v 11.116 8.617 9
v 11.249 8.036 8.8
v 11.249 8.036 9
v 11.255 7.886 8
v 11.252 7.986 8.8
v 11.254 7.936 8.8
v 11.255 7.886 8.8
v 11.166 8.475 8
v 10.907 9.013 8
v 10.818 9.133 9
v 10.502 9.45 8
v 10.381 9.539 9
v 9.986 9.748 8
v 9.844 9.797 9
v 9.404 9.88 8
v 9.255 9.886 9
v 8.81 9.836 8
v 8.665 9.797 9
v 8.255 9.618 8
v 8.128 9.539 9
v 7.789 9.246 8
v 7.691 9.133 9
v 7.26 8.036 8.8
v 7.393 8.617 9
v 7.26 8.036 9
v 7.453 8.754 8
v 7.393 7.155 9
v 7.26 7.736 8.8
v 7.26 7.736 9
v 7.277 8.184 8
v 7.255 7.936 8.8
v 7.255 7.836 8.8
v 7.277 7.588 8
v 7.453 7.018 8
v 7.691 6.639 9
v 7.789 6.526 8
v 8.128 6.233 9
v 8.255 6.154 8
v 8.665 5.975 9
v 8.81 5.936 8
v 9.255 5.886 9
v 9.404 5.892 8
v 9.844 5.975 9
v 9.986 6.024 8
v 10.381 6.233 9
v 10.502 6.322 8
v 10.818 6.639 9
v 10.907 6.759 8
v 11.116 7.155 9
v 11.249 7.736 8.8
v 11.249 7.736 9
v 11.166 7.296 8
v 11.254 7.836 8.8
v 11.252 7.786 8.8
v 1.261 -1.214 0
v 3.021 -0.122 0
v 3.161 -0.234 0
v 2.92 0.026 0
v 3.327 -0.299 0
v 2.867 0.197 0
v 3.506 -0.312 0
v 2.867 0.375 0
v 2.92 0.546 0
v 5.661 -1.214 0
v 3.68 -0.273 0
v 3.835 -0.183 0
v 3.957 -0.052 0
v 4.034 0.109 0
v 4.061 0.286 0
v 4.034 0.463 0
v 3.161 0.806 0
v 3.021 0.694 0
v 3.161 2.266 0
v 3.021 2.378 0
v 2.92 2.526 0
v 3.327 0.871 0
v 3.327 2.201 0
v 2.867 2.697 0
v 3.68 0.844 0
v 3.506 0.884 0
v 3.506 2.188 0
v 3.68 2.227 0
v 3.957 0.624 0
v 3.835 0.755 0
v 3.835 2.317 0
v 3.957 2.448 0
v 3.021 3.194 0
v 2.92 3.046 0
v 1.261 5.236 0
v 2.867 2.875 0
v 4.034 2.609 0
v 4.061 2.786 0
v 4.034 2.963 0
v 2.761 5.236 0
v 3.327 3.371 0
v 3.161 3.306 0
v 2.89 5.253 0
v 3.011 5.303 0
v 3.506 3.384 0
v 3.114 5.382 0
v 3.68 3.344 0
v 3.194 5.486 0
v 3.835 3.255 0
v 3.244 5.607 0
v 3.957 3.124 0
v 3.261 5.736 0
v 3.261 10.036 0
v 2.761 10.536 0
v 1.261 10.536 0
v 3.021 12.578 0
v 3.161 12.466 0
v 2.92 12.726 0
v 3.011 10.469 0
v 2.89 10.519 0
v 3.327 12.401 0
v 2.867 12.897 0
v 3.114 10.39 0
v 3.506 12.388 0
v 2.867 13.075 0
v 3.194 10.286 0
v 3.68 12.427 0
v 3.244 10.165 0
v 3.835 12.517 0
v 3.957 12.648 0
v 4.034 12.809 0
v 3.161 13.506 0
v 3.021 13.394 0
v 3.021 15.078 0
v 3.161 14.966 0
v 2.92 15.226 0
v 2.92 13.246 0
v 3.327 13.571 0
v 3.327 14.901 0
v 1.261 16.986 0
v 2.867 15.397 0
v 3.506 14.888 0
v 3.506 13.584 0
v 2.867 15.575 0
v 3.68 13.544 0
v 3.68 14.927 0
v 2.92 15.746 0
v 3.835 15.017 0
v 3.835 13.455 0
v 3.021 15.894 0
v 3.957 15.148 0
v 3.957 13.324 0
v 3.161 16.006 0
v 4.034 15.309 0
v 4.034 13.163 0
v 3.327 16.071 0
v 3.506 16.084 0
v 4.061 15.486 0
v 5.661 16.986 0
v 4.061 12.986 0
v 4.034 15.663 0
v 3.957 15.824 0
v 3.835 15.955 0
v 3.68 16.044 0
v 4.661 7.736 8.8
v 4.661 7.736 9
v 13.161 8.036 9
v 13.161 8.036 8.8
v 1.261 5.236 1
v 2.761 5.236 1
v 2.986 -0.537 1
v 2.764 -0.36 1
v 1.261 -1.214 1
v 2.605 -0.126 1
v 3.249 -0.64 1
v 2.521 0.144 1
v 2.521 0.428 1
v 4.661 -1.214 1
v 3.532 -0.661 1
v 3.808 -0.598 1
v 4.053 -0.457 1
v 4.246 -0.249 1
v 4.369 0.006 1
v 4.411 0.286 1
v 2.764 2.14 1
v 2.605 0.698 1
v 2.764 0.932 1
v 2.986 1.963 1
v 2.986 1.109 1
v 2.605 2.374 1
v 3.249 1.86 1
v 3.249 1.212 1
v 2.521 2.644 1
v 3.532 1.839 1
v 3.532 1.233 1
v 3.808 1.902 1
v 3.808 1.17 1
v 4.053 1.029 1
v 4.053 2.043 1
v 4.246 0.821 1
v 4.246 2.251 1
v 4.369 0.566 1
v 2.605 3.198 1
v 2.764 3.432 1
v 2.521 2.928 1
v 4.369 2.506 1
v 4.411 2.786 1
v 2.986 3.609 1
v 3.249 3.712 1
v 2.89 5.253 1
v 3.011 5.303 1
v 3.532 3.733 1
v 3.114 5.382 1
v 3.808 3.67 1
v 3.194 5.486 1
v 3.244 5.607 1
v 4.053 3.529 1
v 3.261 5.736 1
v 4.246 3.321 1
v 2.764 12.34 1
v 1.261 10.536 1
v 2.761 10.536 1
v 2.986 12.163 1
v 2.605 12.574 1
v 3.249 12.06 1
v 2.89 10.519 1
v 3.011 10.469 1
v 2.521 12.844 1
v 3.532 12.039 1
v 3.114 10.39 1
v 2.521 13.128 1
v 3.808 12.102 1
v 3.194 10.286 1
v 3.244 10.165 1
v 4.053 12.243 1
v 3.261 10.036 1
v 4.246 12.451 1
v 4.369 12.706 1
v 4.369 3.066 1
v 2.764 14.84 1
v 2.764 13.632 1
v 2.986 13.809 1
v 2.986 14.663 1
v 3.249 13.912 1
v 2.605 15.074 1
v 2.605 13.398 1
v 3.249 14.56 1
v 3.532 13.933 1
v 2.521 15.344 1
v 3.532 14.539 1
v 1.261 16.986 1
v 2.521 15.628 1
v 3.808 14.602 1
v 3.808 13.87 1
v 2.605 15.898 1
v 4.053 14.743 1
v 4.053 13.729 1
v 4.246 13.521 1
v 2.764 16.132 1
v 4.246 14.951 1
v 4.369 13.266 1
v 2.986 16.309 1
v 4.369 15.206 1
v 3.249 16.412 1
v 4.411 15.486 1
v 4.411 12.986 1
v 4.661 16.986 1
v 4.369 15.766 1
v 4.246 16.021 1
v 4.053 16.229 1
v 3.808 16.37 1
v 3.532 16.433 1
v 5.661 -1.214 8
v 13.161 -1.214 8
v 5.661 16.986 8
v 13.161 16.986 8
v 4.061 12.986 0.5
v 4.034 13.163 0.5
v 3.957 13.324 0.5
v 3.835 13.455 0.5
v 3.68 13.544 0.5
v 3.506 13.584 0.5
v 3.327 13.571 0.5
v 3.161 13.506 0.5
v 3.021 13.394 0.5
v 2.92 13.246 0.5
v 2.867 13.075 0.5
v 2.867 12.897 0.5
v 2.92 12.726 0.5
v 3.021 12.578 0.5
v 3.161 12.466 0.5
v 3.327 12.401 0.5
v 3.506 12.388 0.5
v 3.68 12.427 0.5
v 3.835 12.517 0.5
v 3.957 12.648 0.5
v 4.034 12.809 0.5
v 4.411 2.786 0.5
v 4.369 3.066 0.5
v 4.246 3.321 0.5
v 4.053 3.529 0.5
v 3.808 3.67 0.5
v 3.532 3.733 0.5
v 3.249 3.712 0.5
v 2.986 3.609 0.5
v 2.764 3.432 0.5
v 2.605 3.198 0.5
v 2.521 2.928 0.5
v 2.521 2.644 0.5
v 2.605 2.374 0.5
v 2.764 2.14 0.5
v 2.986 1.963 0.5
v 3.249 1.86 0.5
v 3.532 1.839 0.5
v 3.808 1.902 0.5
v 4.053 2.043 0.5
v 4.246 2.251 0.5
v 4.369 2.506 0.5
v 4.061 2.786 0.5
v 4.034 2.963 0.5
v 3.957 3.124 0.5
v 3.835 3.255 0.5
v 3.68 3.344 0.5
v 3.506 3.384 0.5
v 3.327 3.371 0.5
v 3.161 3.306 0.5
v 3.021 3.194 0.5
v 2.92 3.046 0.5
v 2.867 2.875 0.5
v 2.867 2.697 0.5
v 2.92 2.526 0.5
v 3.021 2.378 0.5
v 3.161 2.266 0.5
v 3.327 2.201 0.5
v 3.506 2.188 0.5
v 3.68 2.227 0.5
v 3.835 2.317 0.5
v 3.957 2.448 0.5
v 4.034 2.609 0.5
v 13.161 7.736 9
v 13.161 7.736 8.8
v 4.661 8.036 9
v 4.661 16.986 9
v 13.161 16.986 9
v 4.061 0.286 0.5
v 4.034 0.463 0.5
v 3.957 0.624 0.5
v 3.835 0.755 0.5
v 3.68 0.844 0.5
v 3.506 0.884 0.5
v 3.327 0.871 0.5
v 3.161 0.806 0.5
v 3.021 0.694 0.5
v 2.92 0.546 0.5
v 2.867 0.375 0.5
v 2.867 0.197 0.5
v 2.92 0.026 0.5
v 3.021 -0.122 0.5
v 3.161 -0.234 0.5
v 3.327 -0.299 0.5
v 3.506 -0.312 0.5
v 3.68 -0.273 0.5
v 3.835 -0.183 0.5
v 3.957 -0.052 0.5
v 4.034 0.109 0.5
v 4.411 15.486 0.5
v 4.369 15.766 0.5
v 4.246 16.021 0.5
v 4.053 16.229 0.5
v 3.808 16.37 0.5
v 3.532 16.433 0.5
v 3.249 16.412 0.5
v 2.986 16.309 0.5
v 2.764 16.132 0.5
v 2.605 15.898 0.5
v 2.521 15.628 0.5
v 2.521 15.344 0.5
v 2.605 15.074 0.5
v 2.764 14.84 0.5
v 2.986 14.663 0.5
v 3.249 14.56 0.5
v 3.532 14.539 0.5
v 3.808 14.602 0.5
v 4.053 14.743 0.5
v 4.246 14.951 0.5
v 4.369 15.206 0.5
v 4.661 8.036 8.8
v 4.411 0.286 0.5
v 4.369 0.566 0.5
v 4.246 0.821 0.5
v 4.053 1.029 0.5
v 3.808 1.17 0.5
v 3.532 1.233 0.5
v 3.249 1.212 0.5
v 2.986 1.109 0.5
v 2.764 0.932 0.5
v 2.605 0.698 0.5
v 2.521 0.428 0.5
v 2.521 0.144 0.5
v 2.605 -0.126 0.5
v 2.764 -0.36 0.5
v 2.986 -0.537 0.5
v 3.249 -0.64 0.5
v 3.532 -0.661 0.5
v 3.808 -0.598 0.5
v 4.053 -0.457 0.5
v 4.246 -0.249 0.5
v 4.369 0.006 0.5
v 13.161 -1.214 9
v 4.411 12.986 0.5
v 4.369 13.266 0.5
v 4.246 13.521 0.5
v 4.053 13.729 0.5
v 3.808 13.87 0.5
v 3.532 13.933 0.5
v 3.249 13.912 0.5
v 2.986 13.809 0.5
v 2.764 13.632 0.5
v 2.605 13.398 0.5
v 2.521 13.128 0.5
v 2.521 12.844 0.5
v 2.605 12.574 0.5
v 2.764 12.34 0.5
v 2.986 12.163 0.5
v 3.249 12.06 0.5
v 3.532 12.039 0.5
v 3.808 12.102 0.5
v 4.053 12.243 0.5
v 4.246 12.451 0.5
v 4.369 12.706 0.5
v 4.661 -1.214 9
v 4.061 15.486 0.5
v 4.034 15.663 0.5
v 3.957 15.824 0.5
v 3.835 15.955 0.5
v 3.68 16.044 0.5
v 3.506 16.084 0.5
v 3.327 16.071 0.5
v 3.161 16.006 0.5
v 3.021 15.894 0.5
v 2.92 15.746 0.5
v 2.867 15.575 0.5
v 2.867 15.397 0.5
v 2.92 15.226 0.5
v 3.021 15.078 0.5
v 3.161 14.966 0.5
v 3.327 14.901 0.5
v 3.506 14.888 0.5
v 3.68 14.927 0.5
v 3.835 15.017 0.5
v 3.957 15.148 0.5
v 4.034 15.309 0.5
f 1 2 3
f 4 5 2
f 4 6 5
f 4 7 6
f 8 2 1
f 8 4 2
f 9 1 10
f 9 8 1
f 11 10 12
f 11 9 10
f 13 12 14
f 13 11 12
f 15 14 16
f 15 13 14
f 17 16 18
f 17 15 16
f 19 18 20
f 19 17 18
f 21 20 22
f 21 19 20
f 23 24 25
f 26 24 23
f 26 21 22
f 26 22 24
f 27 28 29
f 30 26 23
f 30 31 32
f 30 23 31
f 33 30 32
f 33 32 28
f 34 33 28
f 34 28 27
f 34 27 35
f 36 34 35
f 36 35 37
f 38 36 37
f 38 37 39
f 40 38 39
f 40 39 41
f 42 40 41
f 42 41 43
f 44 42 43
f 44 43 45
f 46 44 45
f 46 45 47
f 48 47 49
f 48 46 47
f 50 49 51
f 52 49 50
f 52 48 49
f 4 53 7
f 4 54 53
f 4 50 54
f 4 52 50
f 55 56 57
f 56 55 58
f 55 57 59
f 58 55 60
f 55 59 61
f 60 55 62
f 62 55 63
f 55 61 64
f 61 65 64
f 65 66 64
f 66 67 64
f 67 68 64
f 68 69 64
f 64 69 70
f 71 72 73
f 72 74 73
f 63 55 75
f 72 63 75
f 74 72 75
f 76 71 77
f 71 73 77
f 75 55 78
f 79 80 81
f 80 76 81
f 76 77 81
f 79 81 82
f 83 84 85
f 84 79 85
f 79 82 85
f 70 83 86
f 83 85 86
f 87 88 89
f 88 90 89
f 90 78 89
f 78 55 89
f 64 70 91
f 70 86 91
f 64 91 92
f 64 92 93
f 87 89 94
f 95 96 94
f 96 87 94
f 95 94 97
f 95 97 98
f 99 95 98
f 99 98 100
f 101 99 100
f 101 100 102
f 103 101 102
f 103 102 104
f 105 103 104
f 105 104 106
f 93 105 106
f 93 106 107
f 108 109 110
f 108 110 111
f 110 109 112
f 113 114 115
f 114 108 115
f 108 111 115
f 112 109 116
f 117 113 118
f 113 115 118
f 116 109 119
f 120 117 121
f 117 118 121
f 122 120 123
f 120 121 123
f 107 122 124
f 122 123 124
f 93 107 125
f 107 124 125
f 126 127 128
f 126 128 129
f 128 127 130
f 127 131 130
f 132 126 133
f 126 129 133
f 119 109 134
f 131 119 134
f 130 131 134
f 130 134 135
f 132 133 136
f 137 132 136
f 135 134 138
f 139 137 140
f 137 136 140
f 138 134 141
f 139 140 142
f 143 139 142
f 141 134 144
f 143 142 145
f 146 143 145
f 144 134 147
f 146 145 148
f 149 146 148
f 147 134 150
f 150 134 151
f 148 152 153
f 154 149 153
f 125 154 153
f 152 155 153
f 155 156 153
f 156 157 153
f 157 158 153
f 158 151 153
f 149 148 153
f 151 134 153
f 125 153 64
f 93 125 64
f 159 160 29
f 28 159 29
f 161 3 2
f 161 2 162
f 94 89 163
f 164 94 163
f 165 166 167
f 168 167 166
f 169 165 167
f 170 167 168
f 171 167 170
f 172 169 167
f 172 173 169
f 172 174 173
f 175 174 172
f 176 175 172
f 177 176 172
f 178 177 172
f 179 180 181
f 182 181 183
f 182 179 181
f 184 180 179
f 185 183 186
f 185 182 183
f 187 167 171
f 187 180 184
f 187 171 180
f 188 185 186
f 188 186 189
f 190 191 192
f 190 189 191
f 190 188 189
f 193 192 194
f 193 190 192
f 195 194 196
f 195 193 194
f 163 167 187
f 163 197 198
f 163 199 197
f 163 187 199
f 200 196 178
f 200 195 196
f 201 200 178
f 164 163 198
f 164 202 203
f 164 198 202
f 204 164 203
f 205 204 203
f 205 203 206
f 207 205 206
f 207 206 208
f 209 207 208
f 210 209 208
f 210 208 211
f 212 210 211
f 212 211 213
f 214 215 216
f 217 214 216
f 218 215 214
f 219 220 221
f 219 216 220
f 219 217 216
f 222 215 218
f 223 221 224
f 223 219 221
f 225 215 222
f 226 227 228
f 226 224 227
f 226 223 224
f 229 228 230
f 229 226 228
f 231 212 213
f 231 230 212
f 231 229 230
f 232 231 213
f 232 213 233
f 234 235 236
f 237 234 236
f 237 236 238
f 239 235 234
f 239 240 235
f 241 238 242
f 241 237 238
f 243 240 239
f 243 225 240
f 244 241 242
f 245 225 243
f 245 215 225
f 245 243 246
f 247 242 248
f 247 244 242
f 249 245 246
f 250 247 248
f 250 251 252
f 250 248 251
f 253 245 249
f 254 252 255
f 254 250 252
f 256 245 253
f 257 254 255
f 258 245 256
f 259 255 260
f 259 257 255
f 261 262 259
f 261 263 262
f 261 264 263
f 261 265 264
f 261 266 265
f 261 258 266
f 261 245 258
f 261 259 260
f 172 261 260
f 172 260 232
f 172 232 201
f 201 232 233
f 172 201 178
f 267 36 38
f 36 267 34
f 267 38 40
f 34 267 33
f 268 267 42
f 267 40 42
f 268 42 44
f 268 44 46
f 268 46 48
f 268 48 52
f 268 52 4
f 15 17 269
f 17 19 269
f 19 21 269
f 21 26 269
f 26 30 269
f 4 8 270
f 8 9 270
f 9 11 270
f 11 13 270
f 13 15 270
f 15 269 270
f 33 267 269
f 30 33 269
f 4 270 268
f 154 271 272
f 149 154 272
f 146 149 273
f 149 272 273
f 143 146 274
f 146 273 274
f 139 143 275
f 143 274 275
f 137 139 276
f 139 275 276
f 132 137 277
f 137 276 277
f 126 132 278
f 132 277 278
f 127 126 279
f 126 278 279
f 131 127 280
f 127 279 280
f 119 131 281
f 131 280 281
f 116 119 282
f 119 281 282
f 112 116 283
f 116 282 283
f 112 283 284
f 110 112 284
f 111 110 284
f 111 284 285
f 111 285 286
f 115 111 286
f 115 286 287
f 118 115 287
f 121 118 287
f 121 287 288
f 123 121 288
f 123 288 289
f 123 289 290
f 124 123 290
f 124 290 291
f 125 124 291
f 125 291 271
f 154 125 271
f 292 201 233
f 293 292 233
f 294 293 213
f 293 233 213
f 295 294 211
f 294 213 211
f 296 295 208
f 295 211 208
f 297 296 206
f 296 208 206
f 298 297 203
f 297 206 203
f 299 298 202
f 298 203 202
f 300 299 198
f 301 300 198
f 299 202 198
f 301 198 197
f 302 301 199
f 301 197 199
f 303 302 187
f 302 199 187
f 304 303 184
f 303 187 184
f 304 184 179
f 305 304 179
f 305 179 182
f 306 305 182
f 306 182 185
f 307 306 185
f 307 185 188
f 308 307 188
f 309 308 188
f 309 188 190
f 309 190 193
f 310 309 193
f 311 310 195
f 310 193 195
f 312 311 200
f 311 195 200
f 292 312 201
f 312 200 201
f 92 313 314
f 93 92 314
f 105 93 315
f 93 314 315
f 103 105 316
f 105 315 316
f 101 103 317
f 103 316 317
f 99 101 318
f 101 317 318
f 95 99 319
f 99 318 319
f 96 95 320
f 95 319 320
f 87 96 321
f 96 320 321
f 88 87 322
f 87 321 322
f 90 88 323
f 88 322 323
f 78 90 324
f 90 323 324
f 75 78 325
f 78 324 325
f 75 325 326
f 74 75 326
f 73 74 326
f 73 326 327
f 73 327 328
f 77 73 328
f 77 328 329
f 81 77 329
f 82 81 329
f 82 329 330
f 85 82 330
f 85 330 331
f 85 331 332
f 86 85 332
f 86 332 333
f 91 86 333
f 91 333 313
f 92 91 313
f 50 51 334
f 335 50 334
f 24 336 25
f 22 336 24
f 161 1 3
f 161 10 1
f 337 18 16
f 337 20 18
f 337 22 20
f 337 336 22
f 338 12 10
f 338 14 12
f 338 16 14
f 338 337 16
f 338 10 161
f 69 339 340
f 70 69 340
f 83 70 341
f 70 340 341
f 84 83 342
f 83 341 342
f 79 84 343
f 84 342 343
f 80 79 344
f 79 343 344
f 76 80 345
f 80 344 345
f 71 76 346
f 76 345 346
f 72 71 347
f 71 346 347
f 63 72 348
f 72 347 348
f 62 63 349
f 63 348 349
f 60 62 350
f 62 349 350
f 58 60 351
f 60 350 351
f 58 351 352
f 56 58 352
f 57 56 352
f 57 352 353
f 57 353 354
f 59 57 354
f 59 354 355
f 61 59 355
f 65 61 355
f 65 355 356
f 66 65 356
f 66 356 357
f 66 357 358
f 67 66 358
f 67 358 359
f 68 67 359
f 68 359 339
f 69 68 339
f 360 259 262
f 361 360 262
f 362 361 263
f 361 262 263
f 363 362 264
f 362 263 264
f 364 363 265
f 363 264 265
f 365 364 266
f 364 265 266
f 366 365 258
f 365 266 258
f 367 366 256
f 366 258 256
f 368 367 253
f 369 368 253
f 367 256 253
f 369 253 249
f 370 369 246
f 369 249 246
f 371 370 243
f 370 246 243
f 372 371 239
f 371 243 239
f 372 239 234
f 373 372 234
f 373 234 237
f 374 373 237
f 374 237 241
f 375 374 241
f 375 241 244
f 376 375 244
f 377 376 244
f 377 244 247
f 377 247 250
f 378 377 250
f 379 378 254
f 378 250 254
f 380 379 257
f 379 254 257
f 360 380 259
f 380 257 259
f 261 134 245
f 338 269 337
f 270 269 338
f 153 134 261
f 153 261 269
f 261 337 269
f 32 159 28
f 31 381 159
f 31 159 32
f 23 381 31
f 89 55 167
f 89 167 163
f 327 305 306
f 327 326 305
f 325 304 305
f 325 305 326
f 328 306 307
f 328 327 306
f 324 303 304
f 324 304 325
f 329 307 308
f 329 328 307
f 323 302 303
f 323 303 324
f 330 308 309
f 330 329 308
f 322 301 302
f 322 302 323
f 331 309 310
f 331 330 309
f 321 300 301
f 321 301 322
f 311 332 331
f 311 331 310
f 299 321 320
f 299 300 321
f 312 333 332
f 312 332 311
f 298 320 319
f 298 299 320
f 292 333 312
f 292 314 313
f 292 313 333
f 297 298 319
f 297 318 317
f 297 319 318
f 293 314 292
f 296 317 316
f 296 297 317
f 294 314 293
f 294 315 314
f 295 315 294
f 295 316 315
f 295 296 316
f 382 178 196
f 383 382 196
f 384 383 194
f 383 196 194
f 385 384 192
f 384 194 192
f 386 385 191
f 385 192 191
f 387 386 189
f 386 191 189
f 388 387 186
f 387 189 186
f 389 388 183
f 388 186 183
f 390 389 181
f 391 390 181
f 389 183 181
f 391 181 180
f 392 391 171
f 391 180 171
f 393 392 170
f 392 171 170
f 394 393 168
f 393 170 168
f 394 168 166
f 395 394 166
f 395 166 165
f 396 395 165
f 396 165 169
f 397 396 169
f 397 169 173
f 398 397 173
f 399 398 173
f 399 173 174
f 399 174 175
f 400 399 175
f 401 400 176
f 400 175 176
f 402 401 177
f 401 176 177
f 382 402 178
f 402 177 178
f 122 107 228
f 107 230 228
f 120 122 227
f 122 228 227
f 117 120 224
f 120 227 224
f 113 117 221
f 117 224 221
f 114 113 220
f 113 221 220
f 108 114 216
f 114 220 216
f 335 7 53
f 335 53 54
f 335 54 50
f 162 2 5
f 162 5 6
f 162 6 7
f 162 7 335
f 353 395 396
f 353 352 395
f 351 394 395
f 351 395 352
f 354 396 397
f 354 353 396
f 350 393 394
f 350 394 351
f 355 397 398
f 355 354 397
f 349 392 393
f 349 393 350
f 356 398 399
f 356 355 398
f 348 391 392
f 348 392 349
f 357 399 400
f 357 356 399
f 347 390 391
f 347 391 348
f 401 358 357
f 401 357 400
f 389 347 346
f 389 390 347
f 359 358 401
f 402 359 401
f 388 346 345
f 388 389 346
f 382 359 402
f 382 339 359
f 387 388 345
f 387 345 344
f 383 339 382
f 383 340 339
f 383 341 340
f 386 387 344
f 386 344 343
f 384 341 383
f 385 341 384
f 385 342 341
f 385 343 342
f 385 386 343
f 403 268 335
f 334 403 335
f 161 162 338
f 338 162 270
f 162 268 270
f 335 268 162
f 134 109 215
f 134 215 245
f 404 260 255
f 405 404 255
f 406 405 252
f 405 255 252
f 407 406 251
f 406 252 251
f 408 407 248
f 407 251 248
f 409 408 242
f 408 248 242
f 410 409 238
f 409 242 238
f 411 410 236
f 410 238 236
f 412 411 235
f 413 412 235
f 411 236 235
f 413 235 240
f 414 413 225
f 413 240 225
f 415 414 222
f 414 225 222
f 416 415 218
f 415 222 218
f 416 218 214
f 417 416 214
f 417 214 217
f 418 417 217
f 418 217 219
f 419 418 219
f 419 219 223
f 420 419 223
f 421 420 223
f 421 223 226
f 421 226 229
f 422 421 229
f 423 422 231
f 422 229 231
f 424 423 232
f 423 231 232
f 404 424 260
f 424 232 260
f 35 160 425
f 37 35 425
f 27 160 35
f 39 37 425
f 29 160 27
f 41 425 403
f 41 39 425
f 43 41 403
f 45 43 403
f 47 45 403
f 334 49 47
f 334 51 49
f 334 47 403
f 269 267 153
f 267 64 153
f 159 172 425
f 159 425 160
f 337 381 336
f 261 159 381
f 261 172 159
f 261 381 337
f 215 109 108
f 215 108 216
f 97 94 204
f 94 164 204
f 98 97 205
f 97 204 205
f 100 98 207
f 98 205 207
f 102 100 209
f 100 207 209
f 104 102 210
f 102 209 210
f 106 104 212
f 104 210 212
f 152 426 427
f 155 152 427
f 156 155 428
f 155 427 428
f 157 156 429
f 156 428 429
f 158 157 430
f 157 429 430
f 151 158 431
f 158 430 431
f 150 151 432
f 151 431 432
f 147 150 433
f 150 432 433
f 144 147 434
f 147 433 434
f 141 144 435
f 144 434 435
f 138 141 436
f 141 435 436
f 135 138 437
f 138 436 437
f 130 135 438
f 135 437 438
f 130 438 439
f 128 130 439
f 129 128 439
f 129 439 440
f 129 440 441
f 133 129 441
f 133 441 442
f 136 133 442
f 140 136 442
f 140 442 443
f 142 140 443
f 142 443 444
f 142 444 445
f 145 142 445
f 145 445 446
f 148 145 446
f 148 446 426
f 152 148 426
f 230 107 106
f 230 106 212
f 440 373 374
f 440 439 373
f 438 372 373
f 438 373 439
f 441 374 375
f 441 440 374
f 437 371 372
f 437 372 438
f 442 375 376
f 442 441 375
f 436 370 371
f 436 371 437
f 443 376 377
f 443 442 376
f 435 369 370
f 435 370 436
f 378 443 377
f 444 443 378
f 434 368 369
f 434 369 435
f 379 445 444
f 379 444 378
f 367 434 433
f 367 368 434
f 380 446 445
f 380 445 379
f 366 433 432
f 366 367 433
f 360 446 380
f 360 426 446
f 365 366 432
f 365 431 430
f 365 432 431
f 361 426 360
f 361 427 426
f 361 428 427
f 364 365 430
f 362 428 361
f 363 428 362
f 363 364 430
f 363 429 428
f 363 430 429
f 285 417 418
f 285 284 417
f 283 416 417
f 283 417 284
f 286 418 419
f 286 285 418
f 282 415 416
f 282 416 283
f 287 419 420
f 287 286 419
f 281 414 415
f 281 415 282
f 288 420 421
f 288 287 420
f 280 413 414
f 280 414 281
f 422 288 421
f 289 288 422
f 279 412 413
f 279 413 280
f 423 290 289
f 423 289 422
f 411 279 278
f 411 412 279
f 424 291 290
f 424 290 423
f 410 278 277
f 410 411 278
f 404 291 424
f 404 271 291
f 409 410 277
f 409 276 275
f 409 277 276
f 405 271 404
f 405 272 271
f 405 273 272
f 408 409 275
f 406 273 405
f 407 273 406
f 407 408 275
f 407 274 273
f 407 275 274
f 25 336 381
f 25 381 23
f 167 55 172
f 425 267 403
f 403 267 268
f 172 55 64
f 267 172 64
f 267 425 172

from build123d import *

# Parameters (mm, degrees)
SKETCH_3_W          = 4.4
SKETCH_3_H          = 18.2
EXTRUDE_1_DEPTH     = 1
SKETCH_4_R          = 0.95
CUT_EXTRUDE_1_DEPTH = 0.5
SKETCH_5_W          = 1
SKETCH_5_H          = 18.2
EXTRUDE_2_DEPTH     = 7
SKETCH_6_W          = 8.5
SKETCH_6_H          = 18.2
SKETCH_6_R          = 2
EXTRUDE_3_DEPTH     = 1
SKETCH_8_W          = 8.5
SKETCH_8_H          = 0.3
CUT_EXTRUDE_3_DEPTH = 0.2
SKETCH_9_R          = 0.6
CUT_EXTRUDE_4_DEPTH = 24.107989665
SKETCH_10_W         = 1
SKETCH_10_H         = 5.3
CUT_EXTRUDE_5_DEPTH = 2
FILLET_1_R          = 0.5


with BuildPart() as part:
    # 草圖3 → 填料-伸長1 (new body)
    with BuildSketch(Plane.XY):
        with Locations((3.460771452, 7.885973071)):
            Rectangle(SKETCH_3_W, SKETCH_3_H)
    extrude(amount=EXTRUDE_1_DEPTH)

    # 草圖4 → 除料-伸長1 (cut)
    with BuildSketch(Plane.XY.offset(1)):
        with Locations((3.460771452, 15.485973071)):
            Circle(SKETCH_4_R)
        with Locations((3.460771452, 0.285973071)):
            Circle(SKETCH_4_R)
        with Locations((3.460771452, 12.985973071)):
            Circle(SKETCH_4_R)
        with Locations((3.460771452, 2.785973071)):
            Circle(SKETCH_4_R)
    extrude(amount=-CUT_EXTRUDE_1_DEPTH, mode=Mode.SUBTRACT)

    # 草圖5 → 填料-伸長2 (add)
    with BuildSketch(Plane.XY.offset(1)):
        with Locations((5.160771452, 7.885973071)):
            Rectangle(SKETCH_5_W, SKETCH_5_H)
    extrude(amount=EXTRUDE_2_DEPTH)

    # 草圖6 → 填料-伸長3 (add)
    with BuildSketch(Plane.XY.offset(8)):
        with Locations((8.910771452, 7.885973071)):
            Rectangle(SKETCH_6_W, SKETCH_6_H)
        with Locations((9.254845598, 7.885973071)):
            Circle(SKETCH_6_R, mode=Mode.SUBTRACT)
    extrude(amount=EXTRUDE_3_DEPTH)

    # 草圖8 → 除料-伸長3 (cut)
    with BuildSketch(Plane.XY.offset(9)):
        with Locations((8.910771452, 7.885973071)):
            Rectangle(SKETCH_8_W, SKETCH_8_H)
    extrude(amount=-CUT_EXTRUDE_3_DEPTH, mode=Mode.SUBTRACT)

    # 草圖9 → 除料-伸長4 (cut, through all)
    with BuildSketch(Plane.XY.offset(0.5)):
        with Locations((3.460771452, 15.485973071)):
            Circle(SKETCH_9_R)
        with Locations((3.460771452, 12.985973071)):
            Circle(SKETCH_9_R)
        with Locations((3.460771452, 2.785973071)):
            Circle(SKETCH_9_R)
        with Locations((3.460771452, 0.285973071)):
            Circle(SKETCH_9_R)
    extrude(amount=-CUT_EXTRUDE_4_DEPTH, mode=Mode.SUBTRACT)

    # 草圖10 → 除料-伸長5 (cut)
    with BuildSketch(Plane.ZY.offset(-1.260771452)):
        with Locations((0.5, 7.885973071)):
            Rectangle(SKETCH_10_W, SKETCH_10_H)
    extrude(amount=-CUT_EXTRUDE_5_DEPTH, mode=Mode.SUBTRACT)

    # 圓角1
    fillet_1_edges = [part.edges().sort_by_distance(p)[0] for p in [
        (3.260771452, 5.235973071, 0.5),
        (3.260771452, 10.535973071, 0.5),
    ]]
    fillet(fillet_1_edges, radius=FILLET_1_R)


solid = part.part
